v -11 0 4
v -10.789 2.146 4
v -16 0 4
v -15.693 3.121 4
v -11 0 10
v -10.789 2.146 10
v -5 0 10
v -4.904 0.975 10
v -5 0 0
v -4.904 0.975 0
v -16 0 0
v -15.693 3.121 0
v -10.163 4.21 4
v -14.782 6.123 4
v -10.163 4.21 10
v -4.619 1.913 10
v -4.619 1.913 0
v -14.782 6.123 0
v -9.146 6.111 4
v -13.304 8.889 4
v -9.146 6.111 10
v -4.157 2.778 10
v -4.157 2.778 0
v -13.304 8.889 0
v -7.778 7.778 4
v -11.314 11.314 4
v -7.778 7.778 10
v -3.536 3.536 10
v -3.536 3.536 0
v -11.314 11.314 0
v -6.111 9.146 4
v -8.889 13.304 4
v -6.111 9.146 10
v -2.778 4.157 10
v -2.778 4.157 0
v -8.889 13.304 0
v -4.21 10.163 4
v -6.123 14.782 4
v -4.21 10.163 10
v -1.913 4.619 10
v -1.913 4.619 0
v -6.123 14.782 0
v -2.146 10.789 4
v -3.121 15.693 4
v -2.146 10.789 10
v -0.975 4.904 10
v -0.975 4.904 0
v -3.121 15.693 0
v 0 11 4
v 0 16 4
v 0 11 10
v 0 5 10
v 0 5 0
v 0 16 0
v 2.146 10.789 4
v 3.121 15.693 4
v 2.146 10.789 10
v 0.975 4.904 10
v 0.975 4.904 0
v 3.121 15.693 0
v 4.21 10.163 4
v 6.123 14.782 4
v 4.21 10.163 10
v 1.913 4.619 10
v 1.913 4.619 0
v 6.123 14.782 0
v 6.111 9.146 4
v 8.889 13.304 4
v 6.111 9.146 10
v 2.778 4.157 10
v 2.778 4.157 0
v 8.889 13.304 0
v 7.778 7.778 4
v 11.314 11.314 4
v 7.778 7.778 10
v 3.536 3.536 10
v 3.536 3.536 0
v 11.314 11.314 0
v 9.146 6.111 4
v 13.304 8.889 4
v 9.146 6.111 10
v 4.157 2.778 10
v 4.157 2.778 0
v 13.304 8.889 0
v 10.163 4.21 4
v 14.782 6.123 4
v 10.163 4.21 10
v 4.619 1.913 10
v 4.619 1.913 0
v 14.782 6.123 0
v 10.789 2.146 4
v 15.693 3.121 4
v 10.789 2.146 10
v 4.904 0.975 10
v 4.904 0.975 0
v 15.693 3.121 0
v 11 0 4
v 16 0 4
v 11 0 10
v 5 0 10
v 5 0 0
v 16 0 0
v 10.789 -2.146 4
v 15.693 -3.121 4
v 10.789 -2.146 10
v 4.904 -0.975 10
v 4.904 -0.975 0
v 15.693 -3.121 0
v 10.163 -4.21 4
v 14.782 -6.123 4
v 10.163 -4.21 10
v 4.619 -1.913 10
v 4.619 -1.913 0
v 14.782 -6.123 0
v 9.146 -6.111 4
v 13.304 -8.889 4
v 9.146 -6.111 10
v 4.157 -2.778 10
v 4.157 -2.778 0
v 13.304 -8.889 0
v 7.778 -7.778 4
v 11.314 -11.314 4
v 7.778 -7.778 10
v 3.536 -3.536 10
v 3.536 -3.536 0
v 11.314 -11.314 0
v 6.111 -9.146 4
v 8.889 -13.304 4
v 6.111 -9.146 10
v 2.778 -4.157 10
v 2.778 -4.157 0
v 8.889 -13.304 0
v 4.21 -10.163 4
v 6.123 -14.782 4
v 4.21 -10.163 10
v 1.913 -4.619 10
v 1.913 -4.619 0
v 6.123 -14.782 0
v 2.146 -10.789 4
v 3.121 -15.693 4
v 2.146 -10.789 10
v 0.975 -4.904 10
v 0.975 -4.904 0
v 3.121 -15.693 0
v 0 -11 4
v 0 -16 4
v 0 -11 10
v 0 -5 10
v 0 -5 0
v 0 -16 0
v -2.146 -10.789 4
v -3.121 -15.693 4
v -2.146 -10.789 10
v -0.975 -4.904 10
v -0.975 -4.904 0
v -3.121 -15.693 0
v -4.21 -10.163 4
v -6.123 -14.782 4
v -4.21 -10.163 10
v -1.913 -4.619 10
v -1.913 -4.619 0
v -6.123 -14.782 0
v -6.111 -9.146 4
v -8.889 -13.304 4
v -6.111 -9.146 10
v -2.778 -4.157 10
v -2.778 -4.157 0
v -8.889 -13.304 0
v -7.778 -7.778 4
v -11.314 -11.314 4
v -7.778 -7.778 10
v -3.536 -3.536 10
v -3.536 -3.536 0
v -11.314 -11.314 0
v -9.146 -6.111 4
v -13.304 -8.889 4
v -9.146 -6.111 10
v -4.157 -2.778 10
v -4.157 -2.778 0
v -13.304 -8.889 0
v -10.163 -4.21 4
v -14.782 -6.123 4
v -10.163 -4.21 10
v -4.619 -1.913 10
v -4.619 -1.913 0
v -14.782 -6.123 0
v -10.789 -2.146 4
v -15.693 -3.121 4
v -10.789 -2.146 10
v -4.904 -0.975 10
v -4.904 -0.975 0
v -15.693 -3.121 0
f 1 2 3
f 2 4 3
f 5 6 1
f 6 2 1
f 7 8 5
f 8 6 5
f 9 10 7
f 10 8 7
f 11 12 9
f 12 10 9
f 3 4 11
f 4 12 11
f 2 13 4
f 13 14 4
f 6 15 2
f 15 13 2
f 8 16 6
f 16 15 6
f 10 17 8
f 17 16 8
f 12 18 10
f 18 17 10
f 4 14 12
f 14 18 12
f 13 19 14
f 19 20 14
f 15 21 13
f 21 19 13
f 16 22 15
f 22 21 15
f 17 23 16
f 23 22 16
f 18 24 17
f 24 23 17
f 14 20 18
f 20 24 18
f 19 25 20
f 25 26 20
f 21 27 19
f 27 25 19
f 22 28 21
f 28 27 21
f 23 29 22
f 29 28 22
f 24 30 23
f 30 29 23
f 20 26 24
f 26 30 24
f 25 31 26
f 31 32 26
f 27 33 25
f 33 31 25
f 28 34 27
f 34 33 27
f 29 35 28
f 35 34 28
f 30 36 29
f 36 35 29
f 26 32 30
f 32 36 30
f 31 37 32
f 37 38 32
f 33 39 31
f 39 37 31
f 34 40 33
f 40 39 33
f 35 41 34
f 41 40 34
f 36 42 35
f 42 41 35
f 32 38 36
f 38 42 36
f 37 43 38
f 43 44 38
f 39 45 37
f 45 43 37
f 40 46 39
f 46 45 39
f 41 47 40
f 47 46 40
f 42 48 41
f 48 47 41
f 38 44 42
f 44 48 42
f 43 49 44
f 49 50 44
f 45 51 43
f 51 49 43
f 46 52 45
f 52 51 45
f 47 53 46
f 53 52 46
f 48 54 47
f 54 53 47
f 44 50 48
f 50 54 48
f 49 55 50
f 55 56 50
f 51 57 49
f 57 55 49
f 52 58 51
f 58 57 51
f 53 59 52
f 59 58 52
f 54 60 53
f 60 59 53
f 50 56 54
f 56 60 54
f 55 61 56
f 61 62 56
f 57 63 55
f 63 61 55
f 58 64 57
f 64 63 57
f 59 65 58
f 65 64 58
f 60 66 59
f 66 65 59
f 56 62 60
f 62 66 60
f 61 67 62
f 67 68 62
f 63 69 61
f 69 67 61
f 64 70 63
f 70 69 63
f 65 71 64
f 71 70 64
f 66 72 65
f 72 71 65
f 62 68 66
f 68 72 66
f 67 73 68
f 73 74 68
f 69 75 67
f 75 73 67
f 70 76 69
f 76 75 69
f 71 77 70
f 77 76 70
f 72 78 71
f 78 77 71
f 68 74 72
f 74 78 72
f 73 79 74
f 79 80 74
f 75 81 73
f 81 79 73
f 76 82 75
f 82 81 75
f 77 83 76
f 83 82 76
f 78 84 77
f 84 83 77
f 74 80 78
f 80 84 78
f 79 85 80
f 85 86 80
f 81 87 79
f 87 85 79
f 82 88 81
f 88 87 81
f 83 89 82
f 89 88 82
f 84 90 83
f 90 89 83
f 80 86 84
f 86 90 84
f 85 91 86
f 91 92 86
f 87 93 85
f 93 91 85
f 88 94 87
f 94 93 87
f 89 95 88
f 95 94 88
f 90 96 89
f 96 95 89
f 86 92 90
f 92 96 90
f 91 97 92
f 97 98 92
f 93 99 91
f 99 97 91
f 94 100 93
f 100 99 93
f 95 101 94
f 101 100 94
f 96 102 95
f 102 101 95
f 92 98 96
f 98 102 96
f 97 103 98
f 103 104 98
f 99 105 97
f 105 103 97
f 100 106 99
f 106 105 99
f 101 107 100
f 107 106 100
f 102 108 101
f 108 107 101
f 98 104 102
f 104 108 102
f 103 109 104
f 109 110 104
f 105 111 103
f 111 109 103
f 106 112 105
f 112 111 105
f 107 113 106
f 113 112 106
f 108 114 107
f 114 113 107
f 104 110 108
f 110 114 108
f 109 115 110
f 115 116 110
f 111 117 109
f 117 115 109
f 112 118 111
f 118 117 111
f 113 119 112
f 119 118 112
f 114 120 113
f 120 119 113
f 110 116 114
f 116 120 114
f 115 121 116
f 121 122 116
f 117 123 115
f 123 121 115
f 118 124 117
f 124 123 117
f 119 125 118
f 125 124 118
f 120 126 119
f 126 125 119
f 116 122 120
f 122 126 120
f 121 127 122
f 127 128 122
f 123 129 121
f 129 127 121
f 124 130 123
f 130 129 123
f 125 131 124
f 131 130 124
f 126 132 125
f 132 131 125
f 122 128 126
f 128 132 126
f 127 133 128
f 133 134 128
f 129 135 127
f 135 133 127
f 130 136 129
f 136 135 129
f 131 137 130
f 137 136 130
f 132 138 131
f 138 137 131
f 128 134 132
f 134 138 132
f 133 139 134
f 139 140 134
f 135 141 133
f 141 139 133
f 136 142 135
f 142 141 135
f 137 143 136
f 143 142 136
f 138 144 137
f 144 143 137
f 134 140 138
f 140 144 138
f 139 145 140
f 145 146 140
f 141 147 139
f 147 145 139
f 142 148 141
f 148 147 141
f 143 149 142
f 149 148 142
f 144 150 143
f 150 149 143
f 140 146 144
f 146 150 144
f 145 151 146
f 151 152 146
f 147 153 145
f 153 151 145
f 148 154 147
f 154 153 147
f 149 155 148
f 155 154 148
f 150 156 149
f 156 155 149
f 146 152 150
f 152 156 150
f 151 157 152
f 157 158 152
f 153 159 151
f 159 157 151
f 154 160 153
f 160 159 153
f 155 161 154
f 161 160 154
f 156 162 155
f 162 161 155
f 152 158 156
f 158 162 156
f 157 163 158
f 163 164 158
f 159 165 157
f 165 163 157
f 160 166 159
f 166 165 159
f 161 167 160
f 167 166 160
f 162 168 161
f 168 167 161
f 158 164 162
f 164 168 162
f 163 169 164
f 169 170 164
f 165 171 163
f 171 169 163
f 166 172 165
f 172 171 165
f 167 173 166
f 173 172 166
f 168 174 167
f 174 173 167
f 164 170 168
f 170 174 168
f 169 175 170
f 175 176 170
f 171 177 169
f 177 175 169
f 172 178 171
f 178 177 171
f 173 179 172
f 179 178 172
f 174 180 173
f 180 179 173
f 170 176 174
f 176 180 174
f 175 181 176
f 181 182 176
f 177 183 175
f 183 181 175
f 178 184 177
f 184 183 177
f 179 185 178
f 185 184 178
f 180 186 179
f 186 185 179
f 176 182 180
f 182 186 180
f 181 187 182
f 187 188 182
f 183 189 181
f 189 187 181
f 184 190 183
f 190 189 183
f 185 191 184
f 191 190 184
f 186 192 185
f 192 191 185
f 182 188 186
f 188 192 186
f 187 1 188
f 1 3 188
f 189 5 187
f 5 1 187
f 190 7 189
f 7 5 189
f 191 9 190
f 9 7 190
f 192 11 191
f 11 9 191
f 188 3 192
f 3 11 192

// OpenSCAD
$fn = 32;

// ----------------------------------------------------------------------
// Arc stop: collar, 10 mm thick
// ----------------------------------------------------------------------

// --- parameters (mm) ---
revolve_angle = 360;      // full turn around the Z axis
profile_points = 6;       // points of the closed outline

profile = [[5, 0], [16, 0], [16, 4], [11, 4], [11, 10], [5, 10]];  // single closed polygon, 6 points, counter clockwise

// --- the one profile operation ---
rotate_extrude(angle = revolve_angle) polygon(points = profile);
